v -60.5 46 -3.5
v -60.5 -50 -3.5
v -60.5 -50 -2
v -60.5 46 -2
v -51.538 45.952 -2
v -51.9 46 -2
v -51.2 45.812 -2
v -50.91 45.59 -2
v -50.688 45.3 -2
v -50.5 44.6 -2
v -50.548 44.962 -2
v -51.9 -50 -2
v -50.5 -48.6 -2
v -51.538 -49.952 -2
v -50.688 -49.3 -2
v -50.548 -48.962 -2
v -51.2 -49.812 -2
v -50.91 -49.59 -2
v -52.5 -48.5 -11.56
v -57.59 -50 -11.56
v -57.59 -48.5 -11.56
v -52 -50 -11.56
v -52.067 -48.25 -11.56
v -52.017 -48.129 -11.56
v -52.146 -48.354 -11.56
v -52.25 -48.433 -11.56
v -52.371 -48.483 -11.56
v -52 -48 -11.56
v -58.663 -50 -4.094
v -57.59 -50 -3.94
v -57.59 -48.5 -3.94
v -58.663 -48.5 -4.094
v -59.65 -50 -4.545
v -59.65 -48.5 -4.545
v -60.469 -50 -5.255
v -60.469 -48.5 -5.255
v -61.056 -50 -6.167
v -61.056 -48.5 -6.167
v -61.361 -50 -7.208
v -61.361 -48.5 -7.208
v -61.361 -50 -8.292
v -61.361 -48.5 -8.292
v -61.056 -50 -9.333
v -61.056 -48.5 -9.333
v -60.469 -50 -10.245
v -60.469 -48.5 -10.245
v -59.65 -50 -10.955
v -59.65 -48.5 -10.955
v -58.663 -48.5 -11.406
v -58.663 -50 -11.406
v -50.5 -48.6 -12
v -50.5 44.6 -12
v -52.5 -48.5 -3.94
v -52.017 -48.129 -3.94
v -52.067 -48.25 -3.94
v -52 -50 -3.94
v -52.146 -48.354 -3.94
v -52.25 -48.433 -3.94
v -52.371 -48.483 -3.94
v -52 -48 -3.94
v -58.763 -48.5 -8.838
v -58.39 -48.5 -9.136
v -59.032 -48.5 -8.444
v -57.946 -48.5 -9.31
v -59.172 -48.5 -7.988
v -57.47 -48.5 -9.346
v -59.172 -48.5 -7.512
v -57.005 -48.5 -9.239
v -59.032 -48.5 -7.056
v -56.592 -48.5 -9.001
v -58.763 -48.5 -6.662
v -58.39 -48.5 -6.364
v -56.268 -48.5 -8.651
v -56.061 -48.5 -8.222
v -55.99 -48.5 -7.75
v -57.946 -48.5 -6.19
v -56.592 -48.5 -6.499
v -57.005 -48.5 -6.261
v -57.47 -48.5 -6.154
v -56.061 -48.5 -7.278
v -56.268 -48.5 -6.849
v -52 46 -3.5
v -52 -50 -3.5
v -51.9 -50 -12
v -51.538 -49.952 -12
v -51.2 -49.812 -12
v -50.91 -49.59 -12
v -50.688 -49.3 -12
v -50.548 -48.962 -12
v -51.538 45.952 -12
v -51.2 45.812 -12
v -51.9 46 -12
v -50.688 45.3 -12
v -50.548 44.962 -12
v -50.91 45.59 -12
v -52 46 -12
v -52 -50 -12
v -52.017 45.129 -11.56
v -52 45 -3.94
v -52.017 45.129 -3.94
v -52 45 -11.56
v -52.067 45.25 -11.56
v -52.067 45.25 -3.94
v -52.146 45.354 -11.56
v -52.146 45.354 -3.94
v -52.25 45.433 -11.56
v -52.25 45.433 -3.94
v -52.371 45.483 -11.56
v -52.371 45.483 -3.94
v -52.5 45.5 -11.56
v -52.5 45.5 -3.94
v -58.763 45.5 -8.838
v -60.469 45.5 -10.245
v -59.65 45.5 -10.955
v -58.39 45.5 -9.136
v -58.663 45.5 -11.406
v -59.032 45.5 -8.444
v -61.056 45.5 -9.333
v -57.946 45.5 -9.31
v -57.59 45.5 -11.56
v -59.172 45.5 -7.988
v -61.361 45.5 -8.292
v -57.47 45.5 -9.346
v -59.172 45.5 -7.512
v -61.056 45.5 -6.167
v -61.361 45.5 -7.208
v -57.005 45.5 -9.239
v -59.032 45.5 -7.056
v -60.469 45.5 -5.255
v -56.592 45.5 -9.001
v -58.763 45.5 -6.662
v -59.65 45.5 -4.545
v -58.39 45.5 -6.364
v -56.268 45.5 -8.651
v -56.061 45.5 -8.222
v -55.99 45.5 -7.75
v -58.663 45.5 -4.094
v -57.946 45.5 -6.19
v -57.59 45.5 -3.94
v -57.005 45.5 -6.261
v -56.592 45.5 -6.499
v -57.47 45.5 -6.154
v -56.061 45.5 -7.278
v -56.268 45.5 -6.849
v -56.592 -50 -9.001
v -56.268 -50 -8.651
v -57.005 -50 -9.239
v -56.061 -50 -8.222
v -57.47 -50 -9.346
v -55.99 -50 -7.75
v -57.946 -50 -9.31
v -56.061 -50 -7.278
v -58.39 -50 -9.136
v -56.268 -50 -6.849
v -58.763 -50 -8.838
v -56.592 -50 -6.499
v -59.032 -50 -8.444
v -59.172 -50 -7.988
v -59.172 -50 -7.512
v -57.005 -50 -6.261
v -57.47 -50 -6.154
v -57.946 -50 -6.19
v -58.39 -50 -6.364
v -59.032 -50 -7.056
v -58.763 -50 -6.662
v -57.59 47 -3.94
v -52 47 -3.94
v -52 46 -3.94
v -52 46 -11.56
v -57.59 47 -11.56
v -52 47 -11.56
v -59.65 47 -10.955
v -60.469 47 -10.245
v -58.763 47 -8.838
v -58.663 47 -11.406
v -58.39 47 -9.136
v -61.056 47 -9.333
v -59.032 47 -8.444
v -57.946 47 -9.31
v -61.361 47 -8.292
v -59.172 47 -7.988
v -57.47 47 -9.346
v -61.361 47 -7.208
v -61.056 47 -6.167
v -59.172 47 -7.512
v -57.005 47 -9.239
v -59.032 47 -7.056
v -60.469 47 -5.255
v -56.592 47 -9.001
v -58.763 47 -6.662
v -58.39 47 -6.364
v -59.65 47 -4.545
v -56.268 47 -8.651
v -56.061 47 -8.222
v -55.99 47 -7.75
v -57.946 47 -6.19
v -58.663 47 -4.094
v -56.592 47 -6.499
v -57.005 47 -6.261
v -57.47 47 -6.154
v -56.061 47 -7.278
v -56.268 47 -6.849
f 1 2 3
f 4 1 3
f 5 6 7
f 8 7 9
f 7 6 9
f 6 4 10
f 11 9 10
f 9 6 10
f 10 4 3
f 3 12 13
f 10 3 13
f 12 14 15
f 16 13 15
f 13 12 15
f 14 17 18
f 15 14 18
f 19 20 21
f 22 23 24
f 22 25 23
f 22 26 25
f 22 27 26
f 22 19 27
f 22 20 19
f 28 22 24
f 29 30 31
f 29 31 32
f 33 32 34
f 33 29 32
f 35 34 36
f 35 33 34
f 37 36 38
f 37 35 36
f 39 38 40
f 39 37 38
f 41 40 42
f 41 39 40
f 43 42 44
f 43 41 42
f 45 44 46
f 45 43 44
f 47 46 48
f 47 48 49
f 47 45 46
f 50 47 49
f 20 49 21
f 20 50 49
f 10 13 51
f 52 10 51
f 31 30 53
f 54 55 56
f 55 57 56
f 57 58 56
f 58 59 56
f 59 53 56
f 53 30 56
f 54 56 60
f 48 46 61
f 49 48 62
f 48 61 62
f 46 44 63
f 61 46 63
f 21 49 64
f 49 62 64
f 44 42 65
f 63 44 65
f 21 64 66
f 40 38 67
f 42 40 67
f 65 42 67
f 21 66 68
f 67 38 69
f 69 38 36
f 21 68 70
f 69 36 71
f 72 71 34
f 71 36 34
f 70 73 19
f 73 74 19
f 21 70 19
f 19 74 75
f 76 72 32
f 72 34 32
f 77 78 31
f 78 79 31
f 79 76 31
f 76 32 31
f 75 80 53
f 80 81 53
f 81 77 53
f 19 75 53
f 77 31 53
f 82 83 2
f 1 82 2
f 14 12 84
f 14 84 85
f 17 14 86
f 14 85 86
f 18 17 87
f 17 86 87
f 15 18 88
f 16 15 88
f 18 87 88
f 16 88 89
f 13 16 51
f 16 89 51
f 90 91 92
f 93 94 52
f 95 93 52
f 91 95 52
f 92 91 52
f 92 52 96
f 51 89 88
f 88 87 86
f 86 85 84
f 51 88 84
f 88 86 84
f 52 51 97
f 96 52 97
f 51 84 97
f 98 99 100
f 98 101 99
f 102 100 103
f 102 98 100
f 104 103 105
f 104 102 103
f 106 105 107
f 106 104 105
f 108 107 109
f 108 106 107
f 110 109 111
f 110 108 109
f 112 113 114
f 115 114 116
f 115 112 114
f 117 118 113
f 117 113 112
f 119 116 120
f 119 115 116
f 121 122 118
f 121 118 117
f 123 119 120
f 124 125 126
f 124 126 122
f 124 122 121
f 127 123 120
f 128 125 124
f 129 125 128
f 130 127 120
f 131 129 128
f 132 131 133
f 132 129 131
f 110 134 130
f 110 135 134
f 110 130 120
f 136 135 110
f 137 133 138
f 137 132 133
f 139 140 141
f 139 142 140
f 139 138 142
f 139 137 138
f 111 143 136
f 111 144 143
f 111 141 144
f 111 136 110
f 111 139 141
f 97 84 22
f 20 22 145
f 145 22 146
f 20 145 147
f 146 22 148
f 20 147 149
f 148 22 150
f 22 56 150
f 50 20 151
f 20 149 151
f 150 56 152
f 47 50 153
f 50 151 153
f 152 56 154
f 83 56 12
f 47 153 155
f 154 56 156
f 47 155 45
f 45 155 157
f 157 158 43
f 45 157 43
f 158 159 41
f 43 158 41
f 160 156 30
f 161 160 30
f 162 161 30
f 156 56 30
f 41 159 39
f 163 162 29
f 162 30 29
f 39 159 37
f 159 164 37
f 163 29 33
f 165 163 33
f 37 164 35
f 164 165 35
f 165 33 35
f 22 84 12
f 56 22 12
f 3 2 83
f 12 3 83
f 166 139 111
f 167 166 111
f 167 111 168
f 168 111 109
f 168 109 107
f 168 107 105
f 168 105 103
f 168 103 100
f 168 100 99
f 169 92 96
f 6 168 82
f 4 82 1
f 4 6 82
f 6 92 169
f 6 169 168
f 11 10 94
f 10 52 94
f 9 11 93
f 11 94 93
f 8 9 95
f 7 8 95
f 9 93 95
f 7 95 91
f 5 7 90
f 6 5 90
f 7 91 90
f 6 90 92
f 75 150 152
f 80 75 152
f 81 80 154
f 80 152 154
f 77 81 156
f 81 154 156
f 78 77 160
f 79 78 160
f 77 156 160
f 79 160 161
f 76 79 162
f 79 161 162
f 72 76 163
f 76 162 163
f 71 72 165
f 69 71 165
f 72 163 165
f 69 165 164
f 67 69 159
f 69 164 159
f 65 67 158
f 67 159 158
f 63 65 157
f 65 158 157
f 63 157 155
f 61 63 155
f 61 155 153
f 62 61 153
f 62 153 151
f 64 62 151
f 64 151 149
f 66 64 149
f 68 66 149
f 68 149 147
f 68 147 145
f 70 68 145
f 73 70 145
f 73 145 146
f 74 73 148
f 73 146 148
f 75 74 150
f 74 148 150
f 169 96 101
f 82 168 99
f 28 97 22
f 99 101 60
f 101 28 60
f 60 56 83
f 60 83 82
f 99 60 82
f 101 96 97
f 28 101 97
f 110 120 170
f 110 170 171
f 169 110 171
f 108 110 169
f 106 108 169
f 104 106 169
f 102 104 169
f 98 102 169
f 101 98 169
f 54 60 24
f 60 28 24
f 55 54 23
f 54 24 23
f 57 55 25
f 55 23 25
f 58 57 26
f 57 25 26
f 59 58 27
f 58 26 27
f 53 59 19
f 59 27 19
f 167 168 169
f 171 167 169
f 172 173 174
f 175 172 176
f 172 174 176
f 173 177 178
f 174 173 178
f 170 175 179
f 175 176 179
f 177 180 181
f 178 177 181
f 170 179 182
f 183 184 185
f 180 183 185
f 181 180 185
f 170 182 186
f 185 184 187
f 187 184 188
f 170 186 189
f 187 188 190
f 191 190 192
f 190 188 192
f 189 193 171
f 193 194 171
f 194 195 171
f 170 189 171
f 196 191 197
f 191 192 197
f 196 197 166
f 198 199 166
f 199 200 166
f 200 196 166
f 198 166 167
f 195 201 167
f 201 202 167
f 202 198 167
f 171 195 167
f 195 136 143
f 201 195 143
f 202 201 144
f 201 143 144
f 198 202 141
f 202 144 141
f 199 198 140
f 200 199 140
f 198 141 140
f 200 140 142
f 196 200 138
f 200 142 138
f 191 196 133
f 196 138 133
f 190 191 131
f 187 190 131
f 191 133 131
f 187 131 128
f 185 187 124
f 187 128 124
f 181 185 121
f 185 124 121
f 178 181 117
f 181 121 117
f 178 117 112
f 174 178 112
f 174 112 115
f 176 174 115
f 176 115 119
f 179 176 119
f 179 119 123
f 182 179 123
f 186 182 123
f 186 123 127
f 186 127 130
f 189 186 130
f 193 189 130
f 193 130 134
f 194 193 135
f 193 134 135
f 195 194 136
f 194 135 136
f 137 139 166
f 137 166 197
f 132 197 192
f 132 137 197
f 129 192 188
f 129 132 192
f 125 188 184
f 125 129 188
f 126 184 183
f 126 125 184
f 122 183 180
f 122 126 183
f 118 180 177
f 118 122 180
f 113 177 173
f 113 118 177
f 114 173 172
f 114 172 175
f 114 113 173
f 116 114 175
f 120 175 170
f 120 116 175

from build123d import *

# Parameters (mm, degrees)
PAD007_DEPTH        = 96
SKETCH010_R         = 1.6
PAD008_DEPTH        = 1.5
LINEARPATTERN_COUNT = 2
LINEARPATTERN_PITCH = 95.5
FILLET002_R         = 1.4
FILLET003_R         = 0.5
FILLET004_R         = 1.4
FILLET005_R         = 0.5


with BuildPart() as part:
    # Sketch009 (on Face5 of Binder009) → Pad007 (new body)
    with BuildSketch(Plane.XZ.offset(50)):
        Polygon((-60.5, -2), (-50.5, -2), (-50.5, -12), (-52, -12), (-52, -3.5), (-60.5, -3.5), align=None)
    extrude(amount=-PAD007_DEPTH)

    # Sketch010 (on Face7 of Pad007) → Pad008 (join)
    with BuildSketch(Plane.XZ.offset(50)):
        with BuildLine():
            ThreePointArc((-57.59, -3.94), (-61.4, -7.75), (-57.59, -11.56))
            Line((-57.59, -11.56), (-52, -11.56))
            Line((-52, -3.94), (-52, -11.56))
            Line((-57.59, -3.94), (-52, -3.94))
        make_face()
        with Locations((-57.59, -7.75)):
            Circle(SKETCH010_R, mode=Mode.SUBTRACT)
    pad008 = extrude(amount=-PAD008_DEPTH)

    # LinearPattern: Pad008 ×2
    with Locations(*[(0, i * LINEARPATTERN_PITCH, 0) for i in range(1, LINEARPATTERN_COUNT)]):
        add(pad008)

    # Fillet002
    fillet002_edges = [part.edges().sort_by_distance(p)[0] for p in [
        (-50.5, -50, -7),
    ]]
    fillet(fillet002_edges, radius=FILLET002_R)

    # Fillet003
    fillet003_edges = [part.edges().sort_by_distance(p)[0] for p in [
        (-52, -48.5, -7.75),
    ]]
    fillet(fillet003_edges, radius=FILLET003_R)

    # Fillet004
    fillet004_edges = [part.edges().sort_by_distance(p)[0] for p in [
        (-50.5, 46, -7),
    ]]
    fillet(fillet004_edges, radius=FILLET004_R)

    # Fillet005
    fillet005_edges = [part.edges().sort_by_distance(p)[0] for p in [
        (-52, 45.5, -7.75),
    ]]
    fillet(fillet005_edges, radius=FILLET005_R)


solid = part.part
